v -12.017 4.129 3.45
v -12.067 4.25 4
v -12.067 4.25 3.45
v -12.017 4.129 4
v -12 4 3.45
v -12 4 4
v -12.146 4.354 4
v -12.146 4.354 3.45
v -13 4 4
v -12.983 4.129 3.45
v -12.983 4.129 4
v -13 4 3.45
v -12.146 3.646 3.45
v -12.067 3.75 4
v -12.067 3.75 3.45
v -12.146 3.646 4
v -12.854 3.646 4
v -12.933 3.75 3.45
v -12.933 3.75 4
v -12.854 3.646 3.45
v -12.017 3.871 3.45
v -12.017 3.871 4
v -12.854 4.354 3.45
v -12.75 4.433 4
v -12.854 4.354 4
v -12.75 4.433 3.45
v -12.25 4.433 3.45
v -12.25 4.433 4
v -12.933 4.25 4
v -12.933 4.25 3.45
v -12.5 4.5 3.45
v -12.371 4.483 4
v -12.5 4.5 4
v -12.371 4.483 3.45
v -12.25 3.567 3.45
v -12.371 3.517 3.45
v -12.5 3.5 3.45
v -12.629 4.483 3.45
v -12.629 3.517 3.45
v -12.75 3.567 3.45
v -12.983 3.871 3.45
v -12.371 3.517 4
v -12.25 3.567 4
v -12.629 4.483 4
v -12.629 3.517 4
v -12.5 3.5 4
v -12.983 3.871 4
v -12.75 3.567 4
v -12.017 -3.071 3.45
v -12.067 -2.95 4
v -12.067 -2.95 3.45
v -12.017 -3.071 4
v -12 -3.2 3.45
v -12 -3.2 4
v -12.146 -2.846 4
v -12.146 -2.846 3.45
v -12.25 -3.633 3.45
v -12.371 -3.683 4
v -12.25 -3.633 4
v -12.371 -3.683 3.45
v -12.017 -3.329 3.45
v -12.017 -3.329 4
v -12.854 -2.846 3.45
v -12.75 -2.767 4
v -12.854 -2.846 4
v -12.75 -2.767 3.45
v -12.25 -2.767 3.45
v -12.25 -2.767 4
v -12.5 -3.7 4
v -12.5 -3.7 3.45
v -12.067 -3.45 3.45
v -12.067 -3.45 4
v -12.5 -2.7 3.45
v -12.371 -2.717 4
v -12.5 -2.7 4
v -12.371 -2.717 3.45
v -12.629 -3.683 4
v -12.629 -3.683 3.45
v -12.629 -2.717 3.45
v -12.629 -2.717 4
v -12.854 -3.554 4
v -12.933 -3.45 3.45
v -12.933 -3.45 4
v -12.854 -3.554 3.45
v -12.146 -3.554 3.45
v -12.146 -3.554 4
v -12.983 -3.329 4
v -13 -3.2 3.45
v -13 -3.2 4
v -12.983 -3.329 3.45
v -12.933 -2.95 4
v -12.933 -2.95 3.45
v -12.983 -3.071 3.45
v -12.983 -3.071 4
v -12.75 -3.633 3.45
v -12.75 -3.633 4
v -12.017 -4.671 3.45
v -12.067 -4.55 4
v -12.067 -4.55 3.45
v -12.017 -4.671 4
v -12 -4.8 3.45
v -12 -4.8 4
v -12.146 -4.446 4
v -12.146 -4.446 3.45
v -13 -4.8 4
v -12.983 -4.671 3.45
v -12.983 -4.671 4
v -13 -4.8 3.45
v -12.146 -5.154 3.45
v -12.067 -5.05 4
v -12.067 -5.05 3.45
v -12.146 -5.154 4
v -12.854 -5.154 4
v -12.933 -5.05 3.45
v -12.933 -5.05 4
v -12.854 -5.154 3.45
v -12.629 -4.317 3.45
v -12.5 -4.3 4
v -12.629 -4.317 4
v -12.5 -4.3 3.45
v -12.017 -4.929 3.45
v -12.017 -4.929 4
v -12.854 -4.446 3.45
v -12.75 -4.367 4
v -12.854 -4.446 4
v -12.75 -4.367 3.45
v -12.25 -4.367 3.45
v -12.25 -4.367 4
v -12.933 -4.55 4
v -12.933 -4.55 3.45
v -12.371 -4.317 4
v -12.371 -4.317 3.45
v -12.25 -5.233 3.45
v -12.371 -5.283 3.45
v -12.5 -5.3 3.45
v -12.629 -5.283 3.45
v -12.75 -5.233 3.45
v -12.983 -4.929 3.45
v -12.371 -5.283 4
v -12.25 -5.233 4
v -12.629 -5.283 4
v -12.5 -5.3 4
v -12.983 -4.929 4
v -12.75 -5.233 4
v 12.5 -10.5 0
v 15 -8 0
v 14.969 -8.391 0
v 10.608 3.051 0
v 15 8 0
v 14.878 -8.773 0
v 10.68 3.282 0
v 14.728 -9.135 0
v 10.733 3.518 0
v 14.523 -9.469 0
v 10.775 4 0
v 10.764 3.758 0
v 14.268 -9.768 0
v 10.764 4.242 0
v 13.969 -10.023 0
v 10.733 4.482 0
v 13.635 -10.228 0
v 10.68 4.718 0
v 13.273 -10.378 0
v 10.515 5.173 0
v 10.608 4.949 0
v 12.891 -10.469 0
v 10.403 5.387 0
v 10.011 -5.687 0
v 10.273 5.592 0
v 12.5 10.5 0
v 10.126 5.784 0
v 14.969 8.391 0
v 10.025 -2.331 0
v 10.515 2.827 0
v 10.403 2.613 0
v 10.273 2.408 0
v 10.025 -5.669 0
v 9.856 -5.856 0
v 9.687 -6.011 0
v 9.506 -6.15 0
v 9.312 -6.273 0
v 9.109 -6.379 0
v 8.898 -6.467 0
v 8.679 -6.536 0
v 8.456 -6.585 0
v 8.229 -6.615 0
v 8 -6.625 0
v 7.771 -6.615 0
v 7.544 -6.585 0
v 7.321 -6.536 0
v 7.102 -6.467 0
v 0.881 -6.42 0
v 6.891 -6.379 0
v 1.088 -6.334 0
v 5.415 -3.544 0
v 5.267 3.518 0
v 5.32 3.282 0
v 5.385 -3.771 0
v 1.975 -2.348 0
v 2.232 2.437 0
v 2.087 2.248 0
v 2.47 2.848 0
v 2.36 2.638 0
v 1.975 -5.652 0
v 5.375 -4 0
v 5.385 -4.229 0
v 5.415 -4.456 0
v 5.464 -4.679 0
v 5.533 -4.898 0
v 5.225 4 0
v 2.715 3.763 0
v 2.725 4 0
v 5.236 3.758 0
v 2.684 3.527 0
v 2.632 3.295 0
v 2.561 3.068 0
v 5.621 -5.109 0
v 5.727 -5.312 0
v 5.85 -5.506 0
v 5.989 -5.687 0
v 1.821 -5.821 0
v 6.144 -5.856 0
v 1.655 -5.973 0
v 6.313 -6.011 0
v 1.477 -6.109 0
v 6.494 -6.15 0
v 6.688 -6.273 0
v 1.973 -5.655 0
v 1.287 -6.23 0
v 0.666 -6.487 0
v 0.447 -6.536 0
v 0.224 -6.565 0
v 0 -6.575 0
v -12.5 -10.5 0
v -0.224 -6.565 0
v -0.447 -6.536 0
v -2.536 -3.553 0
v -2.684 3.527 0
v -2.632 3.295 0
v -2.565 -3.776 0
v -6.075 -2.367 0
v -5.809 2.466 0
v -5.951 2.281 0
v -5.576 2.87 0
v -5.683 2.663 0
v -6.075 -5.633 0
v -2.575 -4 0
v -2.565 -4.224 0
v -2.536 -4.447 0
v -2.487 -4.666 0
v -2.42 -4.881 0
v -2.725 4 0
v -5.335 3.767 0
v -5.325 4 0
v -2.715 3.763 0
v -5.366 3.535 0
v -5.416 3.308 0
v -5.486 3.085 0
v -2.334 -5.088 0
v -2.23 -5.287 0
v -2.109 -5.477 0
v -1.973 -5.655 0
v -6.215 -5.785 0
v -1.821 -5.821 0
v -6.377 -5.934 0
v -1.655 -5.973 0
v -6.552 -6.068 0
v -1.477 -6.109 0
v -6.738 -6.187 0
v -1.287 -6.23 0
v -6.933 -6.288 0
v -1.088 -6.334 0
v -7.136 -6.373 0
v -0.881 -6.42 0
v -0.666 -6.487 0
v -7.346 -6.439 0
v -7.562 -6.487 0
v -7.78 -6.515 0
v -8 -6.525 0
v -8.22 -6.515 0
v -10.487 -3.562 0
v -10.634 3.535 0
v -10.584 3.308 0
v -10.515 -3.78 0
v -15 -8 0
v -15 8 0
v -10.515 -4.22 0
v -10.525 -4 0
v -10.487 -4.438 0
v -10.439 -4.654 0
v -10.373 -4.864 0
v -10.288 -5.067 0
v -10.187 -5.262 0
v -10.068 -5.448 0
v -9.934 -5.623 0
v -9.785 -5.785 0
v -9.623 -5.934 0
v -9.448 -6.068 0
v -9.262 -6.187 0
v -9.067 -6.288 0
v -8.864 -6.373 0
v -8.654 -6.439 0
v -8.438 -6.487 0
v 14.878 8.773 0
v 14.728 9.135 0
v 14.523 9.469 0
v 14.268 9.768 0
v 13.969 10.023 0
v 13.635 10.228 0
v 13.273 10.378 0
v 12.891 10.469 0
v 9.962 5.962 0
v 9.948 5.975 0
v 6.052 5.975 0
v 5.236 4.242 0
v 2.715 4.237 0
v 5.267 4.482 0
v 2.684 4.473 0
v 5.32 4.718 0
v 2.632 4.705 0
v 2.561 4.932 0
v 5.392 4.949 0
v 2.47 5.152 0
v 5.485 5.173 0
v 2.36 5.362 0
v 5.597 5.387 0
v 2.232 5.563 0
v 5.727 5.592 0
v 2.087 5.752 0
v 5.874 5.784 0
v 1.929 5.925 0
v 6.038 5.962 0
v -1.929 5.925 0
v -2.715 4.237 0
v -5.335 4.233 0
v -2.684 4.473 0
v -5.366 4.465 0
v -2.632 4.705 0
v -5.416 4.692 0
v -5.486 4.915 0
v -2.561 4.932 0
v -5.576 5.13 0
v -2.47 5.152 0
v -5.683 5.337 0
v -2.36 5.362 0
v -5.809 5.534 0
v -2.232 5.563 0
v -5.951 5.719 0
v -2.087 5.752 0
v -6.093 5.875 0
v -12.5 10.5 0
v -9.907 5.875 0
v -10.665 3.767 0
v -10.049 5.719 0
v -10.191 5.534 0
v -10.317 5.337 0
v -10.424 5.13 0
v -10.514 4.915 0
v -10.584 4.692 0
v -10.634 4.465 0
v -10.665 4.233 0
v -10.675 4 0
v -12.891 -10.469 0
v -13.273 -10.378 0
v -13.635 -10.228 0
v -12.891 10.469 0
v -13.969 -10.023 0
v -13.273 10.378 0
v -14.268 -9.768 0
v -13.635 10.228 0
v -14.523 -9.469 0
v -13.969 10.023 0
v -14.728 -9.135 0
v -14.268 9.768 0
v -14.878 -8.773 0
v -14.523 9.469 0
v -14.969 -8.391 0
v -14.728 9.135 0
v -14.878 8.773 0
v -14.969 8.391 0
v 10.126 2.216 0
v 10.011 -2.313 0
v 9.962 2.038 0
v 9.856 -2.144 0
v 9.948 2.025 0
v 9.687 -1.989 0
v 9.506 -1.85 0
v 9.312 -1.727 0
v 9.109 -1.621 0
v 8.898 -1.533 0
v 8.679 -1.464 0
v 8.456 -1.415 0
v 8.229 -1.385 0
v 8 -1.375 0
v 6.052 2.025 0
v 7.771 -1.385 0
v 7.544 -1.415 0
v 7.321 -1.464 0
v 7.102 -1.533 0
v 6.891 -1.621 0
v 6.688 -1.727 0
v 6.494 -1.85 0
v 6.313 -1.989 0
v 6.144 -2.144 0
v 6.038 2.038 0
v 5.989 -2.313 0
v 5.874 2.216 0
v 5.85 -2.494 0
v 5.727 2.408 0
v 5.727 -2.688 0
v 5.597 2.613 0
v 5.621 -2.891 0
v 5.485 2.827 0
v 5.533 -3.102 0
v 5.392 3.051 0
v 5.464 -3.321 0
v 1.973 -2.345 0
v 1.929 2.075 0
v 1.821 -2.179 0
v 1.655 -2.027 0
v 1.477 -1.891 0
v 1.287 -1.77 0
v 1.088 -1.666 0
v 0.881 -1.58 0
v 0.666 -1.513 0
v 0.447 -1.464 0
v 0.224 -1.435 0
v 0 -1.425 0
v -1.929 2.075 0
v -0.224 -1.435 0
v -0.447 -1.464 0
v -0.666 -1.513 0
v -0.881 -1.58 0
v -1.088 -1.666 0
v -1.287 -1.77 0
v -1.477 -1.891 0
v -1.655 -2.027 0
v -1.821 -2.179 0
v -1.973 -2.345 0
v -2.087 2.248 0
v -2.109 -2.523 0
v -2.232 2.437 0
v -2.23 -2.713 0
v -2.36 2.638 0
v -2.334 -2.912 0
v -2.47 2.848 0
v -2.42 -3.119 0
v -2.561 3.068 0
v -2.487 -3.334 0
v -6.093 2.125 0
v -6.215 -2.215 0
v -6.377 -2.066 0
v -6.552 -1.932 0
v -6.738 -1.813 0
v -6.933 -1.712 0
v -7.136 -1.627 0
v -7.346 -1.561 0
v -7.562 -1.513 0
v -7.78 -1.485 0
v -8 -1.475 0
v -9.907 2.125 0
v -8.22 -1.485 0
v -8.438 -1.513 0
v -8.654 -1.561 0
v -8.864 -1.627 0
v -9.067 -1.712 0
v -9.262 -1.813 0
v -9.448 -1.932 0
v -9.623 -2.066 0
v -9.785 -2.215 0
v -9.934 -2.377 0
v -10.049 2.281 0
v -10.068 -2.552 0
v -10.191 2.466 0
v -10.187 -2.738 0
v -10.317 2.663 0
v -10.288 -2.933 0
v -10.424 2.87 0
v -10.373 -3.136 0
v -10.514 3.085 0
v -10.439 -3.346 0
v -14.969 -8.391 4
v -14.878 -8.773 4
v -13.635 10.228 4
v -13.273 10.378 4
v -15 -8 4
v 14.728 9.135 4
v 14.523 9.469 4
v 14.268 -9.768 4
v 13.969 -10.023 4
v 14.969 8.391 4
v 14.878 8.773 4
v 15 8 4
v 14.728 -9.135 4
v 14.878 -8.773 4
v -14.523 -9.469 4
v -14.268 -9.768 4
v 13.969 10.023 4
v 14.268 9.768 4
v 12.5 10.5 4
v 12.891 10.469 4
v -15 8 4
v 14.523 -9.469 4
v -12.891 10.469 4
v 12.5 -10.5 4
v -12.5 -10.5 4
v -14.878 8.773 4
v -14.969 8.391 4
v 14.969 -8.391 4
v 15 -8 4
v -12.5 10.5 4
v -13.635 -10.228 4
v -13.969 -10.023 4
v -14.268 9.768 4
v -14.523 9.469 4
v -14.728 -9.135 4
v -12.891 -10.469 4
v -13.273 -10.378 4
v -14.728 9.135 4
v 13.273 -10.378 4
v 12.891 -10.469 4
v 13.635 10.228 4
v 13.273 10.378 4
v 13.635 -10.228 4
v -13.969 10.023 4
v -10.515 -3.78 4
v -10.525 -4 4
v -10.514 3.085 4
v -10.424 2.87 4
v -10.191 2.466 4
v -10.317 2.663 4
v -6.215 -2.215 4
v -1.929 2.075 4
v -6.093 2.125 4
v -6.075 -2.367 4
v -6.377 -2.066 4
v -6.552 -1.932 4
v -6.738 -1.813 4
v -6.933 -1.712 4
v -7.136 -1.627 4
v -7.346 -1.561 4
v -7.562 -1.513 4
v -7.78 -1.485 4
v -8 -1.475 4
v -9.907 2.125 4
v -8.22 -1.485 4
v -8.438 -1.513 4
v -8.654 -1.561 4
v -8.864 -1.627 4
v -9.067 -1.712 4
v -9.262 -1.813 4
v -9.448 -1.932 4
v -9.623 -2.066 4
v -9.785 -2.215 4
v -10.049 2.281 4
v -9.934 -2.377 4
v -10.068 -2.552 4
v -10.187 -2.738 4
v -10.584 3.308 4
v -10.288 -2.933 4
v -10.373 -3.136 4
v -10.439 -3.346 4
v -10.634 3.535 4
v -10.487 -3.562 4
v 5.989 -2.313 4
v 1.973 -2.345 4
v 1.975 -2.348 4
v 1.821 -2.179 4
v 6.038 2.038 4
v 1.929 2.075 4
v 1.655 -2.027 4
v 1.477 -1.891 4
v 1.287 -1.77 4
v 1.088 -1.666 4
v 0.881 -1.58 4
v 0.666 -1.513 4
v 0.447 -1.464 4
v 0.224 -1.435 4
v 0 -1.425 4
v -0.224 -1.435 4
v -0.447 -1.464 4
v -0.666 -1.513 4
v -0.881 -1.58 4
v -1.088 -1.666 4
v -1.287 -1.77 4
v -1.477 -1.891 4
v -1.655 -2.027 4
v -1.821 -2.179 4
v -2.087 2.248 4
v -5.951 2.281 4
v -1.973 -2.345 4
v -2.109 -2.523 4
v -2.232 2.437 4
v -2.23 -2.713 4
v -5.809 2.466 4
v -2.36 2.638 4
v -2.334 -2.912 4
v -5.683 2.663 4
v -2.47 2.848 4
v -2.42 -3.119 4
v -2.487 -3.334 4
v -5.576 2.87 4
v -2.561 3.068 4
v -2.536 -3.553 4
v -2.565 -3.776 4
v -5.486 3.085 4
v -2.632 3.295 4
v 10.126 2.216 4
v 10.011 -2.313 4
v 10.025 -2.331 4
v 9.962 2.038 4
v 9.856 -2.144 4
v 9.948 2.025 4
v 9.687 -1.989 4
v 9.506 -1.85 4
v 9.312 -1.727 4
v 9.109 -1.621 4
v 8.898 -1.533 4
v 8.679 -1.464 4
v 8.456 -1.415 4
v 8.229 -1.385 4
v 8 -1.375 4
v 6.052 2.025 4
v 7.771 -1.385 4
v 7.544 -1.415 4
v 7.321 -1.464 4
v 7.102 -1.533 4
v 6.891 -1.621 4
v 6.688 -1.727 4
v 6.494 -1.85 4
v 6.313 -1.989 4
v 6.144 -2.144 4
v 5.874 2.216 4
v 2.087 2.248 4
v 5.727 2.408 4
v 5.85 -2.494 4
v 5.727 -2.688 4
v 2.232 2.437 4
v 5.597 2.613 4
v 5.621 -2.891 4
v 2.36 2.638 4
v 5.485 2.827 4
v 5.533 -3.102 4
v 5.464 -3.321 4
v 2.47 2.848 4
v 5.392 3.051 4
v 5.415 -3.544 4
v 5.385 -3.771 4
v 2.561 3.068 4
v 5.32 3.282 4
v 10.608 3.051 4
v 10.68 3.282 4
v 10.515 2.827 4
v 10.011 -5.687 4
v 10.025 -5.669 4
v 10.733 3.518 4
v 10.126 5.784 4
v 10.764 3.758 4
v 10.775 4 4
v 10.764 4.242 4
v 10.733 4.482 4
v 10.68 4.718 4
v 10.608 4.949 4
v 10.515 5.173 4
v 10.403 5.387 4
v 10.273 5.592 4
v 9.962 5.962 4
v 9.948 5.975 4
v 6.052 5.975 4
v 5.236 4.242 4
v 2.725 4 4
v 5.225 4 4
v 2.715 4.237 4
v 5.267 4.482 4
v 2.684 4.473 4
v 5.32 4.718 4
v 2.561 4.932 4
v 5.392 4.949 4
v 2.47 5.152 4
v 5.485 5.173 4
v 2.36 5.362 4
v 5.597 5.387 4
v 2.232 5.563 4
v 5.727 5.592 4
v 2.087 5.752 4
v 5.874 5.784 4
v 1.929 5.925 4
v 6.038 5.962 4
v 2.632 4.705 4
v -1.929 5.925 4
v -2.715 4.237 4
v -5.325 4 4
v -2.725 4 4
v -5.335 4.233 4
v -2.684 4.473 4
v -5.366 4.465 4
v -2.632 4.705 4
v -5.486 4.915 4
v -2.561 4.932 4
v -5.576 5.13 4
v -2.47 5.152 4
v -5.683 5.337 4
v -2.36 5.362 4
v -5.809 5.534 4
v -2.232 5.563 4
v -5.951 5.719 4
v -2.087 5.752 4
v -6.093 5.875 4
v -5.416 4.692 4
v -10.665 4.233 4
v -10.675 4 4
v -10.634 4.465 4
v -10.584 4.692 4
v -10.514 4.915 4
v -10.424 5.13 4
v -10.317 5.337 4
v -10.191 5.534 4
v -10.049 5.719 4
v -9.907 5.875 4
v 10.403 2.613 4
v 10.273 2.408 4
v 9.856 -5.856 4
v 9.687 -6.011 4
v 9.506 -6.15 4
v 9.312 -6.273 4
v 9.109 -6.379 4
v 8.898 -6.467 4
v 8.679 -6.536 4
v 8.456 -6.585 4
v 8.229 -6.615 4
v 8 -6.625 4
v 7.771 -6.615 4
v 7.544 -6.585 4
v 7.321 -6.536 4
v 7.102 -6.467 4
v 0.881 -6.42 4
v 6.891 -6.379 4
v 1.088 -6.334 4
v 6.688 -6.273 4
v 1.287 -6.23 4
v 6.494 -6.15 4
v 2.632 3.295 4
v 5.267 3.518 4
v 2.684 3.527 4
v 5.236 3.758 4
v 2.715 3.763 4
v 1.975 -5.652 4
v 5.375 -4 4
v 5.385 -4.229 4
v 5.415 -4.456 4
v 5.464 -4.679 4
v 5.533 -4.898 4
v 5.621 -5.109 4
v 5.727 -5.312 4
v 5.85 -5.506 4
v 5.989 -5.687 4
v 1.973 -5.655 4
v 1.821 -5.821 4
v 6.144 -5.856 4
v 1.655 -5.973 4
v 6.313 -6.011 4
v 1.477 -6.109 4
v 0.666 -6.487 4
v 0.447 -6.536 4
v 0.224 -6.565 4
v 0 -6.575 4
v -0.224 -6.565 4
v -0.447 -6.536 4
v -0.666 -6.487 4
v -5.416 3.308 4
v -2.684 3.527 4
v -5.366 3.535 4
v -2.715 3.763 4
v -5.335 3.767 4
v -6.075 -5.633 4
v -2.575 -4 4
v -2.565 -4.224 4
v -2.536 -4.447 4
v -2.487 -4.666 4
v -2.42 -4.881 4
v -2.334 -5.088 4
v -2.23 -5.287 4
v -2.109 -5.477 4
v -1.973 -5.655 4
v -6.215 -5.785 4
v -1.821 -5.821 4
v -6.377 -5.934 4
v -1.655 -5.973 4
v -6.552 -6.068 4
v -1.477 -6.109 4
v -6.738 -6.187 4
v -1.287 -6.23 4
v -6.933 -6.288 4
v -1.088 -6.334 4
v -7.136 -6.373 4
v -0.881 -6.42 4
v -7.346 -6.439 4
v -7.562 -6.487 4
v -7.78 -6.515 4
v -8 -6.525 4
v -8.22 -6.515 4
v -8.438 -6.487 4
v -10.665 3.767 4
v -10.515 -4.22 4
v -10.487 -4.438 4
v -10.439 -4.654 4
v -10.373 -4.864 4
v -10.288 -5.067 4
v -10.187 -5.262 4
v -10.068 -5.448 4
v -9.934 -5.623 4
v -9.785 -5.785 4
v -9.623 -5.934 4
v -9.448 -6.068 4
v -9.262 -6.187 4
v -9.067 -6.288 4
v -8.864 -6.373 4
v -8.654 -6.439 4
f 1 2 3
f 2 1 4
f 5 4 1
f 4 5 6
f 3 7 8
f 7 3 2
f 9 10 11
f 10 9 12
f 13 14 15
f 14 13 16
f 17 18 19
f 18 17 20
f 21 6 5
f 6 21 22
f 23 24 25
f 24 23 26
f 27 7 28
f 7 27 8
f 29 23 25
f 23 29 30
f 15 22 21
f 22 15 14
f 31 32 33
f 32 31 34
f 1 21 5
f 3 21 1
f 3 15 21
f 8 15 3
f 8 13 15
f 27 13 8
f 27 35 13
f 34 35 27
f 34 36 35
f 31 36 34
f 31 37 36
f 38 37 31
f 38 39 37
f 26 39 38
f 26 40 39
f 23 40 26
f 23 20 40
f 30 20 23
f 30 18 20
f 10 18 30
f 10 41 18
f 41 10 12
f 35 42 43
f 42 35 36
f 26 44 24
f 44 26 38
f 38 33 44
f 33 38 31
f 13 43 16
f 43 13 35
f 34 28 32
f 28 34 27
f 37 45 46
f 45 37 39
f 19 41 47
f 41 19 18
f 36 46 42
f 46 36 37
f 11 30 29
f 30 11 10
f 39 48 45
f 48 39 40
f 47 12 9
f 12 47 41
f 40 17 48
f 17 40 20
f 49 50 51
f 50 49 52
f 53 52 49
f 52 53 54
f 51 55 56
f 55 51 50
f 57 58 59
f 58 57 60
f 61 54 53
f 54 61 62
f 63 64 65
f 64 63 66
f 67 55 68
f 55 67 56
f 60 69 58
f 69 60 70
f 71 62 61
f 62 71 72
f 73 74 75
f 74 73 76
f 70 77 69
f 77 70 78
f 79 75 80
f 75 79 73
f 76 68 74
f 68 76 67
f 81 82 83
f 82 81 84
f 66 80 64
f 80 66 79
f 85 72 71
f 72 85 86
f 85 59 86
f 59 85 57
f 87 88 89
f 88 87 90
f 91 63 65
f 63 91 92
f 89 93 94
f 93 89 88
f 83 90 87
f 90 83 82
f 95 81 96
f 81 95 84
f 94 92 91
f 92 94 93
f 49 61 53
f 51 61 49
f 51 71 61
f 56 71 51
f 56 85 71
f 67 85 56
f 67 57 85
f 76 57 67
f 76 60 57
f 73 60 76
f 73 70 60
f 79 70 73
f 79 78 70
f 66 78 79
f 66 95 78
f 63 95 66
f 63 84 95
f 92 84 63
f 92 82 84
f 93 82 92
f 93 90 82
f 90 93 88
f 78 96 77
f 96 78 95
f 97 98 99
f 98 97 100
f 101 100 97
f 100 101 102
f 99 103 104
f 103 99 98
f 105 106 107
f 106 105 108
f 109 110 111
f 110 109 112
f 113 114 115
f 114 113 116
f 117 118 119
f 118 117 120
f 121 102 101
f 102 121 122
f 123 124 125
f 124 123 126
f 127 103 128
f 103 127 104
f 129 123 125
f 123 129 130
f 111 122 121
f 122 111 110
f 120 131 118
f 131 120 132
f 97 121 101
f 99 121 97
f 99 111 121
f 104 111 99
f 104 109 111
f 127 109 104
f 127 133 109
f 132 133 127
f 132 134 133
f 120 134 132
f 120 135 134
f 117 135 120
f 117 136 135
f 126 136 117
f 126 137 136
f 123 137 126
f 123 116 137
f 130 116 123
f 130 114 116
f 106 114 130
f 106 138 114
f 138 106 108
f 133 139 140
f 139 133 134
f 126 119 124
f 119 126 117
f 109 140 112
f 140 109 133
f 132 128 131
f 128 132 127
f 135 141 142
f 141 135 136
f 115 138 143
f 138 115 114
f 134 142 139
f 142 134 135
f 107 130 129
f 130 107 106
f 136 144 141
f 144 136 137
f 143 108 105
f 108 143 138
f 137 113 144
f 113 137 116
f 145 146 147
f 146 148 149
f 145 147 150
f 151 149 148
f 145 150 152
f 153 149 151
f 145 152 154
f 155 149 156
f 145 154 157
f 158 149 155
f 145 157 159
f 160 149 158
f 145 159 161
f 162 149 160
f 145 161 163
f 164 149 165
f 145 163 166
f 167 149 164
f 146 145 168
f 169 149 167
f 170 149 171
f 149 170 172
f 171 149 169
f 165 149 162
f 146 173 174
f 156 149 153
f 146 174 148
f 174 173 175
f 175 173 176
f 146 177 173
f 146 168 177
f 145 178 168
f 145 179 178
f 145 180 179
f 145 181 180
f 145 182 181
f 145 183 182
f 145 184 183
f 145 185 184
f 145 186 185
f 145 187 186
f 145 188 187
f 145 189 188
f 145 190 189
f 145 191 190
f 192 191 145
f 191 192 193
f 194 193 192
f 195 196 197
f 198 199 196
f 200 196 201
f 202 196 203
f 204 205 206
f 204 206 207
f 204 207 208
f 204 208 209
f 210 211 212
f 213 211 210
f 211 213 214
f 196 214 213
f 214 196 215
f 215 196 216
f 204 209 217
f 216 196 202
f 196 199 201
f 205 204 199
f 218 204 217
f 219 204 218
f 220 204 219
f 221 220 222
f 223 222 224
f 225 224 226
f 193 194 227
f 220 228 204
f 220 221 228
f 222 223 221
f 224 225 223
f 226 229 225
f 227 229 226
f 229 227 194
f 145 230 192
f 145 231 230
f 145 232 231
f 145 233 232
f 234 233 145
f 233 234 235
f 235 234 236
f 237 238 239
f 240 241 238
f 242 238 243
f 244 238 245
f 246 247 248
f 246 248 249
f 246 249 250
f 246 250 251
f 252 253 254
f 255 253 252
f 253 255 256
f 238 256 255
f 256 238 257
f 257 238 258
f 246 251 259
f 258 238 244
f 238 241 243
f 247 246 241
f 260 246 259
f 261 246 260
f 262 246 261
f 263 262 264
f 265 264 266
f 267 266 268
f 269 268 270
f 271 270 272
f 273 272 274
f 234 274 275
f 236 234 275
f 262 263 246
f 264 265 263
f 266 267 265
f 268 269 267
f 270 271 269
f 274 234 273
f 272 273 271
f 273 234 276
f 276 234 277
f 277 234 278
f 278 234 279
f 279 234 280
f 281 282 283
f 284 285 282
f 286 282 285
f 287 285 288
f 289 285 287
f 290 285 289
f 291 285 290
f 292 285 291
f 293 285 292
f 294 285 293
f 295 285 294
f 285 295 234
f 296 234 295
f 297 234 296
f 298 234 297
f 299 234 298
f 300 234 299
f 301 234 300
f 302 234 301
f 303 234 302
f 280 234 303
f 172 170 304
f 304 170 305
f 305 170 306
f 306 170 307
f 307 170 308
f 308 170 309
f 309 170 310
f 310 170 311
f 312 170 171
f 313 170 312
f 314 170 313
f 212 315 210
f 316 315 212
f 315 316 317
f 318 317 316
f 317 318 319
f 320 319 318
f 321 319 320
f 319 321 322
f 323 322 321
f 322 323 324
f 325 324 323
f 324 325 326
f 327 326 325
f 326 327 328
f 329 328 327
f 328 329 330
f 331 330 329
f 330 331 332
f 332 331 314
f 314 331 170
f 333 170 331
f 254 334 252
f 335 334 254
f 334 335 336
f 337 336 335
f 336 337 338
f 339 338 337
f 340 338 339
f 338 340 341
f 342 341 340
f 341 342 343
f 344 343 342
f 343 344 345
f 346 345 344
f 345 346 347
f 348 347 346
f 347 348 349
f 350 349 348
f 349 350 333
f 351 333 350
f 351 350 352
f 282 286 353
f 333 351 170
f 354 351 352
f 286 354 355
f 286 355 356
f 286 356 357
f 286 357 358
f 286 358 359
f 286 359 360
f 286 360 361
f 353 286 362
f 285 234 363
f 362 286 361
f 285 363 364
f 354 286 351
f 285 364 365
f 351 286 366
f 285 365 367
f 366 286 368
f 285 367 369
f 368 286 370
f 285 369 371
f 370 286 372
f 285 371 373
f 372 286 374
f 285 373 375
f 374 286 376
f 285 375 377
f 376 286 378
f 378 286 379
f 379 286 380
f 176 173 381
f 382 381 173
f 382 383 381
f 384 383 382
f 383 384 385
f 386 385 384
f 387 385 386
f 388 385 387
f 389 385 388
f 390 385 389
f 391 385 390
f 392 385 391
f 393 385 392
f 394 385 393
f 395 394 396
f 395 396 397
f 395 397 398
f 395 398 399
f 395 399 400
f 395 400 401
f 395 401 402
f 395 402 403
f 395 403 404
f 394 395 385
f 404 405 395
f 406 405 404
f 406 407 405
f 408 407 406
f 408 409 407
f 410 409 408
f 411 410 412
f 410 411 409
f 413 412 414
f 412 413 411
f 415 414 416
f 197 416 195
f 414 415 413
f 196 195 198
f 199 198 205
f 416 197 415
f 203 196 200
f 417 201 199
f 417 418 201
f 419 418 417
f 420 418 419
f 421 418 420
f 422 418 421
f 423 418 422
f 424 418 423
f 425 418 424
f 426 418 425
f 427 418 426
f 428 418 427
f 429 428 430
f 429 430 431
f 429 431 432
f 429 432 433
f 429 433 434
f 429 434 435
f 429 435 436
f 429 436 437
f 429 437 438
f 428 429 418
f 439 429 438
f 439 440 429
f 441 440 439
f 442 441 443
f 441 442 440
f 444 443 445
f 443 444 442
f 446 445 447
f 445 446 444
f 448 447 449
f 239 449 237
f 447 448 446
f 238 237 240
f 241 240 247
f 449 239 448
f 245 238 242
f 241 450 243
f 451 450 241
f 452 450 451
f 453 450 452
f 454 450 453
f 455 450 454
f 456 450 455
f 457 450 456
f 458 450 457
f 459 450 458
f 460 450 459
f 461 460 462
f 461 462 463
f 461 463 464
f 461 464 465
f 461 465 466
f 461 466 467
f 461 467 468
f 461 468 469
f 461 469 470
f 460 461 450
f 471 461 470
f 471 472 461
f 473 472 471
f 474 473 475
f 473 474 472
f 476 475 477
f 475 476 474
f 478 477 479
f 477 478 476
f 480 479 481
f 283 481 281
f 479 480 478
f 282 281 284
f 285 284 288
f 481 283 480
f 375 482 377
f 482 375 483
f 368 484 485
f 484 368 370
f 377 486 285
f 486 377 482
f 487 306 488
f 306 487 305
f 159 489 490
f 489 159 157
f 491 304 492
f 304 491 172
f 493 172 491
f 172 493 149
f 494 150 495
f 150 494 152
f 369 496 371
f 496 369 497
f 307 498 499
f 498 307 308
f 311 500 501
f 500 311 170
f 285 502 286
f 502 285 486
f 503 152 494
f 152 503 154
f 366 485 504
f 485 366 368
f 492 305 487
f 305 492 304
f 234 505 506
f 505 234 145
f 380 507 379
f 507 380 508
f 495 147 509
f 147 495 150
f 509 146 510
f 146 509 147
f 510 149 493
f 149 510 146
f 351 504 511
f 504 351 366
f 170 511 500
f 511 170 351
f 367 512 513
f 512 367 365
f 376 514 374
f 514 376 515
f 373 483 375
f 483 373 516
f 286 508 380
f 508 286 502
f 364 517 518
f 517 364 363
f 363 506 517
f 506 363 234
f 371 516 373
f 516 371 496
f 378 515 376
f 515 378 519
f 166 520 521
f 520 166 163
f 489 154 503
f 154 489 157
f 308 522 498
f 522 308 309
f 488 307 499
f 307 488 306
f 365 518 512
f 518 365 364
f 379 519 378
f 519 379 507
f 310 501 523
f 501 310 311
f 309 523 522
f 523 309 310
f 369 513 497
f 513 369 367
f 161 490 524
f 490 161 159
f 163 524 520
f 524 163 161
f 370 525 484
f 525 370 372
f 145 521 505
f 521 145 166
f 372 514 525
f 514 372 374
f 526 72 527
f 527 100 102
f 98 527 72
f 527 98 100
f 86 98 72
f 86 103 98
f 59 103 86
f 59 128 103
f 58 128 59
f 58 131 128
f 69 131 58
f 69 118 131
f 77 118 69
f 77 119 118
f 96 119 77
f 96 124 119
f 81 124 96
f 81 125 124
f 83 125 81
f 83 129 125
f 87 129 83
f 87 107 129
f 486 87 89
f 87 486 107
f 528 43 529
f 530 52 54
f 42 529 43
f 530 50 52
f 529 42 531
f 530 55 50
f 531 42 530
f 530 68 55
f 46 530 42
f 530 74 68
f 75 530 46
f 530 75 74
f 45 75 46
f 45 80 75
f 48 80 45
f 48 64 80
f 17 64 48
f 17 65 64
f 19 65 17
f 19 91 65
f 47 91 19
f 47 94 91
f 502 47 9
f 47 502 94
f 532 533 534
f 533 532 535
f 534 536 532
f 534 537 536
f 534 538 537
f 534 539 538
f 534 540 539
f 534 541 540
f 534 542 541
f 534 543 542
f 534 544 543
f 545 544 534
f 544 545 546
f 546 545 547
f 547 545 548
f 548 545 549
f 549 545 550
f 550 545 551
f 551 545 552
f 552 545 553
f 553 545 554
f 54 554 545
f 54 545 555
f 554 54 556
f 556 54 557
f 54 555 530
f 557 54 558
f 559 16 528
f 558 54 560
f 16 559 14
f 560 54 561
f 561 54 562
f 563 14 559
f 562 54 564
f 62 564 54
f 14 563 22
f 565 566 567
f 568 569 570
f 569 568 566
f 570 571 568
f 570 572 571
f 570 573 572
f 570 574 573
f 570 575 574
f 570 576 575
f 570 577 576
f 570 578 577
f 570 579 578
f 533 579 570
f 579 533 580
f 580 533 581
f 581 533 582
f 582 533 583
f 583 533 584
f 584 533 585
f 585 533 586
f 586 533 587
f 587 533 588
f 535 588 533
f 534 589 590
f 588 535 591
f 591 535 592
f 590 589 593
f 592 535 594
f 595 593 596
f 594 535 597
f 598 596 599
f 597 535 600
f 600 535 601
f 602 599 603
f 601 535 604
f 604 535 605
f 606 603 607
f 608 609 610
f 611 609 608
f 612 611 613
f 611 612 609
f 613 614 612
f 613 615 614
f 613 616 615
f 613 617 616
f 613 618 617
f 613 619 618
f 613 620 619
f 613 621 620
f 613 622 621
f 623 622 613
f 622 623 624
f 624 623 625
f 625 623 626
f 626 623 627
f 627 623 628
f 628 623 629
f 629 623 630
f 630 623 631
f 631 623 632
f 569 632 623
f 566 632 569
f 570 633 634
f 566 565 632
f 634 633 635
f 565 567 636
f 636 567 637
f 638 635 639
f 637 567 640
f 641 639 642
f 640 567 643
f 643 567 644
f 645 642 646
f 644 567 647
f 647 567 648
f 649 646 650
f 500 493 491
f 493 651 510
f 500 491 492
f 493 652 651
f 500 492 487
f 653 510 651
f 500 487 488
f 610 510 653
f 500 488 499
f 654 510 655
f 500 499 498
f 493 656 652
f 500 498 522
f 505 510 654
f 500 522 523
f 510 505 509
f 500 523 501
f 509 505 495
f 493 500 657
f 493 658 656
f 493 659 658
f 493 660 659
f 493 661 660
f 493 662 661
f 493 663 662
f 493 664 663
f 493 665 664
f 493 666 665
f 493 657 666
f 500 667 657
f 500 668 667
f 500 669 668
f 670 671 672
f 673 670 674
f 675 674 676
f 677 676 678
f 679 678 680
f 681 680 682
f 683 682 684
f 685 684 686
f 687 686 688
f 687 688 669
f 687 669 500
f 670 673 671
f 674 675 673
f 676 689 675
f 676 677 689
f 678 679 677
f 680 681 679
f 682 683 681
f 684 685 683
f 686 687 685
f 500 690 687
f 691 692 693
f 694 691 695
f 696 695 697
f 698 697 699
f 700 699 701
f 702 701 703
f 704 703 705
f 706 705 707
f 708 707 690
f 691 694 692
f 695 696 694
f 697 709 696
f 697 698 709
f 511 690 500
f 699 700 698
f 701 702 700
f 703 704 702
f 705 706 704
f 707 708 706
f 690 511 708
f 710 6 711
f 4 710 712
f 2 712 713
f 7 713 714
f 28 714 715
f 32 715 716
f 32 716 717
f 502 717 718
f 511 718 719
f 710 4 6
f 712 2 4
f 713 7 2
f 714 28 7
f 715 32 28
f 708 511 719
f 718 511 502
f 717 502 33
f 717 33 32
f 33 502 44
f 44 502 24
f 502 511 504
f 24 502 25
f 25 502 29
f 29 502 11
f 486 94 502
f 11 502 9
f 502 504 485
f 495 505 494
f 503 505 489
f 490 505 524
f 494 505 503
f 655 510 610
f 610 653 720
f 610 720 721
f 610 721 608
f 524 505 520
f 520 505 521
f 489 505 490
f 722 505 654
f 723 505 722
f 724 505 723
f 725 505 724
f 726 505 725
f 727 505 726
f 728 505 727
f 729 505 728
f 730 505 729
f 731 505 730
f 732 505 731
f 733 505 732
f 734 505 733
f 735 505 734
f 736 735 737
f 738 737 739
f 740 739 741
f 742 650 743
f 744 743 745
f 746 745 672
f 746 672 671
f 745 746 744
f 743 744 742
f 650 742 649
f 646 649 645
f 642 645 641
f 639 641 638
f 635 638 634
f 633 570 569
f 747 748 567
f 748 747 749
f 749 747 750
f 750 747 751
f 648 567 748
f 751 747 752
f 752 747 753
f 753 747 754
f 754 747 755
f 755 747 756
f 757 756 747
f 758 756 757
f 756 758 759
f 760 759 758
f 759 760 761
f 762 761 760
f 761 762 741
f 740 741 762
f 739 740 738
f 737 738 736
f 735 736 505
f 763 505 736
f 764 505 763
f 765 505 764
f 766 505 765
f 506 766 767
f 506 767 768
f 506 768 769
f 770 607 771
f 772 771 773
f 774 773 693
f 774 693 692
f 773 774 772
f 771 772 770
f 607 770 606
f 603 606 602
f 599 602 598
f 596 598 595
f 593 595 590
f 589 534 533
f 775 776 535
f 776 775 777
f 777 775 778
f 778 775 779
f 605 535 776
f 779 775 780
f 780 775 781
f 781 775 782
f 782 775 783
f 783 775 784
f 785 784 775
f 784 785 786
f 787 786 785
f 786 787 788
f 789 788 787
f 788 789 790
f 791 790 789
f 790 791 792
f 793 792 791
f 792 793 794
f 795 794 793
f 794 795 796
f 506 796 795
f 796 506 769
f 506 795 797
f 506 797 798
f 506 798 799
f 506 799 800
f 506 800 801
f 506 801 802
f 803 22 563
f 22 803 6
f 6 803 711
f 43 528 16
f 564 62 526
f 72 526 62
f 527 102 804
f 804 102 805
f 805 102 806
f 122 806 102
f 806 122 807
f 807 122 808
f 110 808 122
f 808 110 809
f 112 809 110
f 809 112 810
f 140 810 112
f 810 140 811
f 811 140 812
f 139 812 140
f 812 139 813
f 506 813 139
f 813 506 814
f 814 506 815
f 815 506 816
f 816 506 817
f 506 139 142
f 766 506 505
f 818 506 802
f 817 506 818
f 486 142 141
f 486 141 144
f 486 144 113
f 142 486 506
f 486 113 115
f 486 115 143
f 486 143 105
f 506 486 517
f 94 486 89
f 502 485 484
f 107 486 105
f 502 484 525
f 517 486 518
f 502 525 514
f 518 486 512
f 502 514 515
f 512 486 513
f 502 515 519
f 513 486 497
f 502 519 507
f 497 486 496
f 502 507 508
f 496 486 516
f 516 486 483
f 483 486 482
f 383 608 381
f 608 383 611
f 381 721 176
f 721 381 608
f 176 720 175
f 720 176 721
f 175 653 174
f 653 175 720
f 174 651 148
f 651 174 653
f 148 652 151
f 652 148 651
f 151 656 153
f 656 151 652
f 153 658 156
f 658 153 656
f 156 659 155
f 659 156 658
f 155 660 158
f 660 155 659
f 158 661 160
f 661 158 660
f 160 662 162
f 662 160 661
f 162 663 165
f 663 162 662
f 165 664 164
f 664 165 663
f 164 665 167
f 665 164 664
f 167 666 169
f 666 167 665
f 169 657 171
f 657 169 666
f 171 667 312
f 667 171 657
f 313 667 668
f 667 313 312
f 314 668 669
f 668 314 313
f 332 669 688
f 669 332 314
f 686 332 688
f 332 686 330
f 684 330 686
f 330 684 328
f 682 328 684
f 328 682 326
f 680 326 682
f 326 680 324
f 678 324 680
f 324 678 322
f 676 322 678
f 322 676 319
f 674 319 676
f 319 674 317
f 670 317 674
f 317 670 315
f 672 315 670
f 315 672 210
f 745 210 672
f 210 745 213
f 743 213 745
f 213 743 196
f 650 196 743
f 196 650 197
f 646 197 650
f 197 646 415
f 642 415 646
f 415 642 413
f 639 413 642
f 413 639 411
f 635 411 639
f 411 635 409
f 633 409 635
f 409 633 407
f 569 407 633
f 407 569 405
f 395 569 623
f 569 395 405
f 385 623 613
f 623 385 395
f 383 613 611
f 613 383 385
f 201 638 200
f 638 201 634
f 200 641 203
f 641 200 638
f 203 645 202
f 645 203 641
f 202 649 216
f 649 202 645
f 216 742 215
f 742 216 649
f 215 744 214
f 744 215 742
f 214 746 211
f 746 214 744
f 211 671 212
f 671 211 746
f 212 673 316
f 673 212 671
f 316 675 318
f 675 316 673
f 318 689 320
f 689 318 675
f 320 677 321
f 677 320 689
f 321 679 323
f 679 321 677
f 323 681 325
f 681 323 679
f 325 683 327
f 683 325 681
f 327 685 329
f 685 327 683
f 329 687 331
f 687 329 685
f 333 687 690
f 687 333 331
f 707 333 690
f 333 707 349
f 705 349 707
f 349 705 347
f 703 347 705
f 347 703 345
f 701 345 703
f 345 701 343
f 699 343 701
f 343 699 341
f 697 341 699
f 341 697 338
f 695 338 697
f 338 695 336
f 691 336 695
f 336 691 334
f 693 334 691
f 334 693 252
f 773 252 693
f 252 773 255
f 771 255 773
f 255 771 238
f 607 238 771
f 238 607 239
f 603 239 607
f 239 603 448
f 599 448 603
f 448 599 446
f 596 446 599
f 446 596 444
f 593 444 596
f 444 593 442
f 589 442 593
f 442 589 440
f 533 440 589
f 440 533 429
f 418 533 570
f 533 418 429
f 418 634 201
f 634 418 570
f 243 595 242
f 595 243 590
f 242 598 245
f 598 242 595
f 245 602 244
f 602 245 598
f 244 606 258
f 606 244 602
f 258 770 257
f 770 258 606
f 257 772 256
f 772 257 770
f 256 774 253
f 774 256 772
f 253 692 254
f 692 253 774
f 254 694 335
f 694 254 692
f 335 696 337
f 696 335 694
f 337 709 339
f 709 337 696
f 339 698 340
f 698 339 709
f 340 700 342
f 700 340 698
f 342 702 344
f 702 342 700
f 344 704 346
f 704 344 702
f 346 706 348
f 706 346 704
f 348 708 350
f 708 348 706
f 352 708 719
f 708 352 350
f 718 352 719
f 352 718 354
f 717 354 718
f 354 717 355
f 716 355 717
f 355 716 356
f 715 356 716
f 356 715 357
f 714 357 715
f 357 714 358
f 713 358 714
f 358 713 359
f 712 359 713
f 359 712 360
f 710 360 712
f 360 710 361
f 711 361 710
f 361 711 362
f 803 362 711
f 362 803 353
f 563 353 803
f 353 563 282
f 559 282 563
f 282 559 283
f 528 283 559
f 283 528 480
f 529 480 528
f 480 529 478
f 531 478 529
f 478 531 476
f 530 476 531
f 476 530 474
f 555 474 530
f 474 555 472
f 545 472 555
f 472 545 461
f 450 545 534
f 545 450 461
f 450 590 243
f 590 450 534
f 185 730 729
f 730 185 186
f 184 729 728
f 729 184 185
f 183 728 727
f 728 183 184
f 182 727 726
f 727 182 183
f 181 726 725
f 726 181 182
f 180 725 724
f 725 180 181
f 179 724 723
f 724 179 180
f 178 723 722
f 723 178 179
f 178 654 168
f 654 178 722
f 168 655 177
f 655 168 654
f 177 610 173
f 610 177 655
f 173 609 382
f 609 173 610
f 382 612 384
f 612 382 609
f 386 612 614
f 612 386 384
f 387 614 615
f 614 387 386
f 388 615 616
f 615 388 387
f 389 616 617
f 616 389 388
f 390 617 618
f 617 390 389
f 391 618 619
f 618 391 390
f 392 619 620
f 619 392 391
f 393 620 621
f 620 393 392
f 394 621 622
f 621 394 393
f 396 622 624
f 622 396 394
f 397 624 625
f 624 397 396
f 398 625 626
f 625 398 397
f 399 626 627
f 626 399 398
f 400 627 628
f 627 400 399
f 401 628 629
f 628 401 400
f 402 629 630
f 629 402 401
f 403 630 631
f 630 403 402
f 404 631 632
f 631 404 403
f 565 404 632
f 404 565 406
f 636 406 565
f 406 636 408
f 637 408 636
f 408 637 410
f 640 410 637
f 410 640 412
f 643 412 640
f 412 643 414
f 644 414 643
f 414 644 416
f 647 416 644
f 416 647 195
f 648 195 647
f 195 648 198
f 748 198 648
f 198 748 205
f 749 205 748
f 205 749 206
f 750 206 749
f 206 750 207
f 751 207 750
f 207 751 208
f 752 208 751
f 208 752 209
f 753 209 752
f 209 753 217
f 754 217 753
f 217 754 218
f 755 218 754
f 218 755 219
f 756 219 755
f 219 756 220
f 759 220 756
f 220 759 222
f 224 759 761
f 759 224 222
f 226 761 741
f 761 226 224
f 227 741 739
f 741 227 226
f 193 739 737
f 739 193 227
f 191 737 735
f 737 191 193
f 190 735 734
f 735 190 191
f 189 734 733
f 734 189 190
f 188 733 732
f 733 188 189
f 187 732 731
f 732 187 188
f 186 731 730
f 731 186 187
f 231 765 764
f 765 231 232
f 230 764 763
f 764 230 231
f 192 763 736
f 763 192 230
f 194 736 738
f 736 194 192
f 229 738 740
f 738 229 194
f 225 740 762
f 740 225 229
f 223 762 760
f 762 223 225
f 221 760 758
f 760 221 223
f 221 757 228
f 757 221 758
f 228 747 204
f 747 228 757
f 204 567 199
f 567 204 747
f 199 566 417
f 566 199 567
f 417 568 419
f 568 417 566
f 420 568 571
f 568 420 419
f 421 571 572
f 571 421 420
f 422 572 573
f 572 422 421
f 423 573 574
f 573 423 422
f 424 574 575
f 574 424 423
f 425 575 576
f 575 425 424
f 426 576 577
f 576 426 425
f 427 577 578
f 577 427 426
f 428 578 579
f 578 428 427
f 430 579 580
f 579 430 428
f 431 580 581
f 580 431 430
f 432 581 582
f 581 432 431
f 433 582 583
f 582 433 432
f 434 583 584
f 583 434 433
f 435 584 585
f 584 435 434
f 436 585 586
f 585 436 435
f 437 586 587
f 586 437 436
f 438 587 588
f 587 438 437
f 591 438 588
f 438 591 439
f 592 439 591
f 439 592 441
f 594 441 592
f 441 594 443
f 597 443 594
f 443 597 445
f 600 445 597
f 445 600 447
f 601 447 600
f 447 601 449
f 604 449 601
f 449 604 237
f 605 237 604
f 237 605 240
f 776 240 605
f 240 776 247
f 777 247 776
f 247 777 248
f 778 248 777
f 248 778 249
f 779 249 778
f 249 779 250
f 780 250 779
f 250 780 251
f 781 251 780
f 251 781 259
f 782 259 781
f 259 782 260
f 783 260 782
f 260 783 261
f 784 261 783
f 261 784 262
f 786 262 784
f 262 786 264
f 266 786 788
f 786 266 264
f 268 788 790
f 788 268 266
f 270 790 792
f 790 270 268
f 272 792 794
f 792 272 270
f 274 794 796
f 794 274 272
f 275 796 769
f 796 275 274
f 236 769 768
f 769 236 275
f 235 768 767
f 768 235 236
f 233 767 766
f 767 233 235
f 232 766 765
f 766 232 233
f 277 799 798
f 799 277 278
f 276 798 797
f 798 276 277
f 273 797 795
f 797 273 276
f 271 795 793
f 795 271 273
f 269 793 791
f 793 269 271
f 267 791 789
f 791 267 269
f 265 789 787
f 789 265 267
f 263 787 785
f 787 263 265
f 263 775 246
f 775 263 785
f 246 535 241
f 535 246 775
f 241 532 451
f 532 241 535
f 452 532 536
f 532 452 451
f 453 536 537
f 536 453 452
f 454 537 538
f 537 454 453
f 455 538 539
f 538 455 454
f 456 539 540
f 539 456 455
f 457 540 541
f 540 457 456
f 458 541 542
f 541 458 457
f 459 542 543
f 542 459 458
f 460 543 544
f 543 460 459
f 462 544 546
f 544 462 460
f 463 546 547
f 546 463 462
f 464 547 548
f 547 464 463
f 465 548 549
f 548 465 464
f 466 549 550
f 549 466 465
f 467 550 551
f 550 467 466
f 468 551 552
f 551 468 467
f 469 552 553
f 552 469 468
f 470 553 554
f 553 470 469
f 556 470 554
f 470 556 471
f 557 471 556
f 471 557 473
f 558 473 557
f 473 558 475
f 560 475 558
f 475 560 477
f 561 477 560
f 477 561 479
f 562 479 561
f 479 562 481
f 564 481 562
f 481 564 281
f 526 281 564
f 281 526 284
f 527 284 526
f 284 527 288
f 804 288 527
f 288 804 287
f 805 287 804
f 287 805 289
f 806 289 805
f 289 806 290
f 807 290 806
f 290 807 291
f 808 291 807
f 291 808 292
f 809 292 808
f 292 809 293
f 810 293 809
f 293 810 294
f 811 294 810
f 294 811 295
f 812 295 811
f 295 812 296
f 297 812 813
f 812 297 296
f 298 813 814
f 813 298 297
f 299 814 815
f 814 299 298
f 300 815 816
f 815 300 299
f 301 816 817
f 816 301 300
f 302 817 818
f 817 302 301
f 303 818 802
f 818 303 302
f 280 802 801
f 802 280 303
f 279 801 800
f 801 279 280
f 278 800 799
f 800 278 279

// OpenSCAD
// MoseRase drive parts, dimensions in millimetres.
// Print the selected part with Z=0 against the bed.

/* [Part] */
drive_part = "fit_gauge"; // [fit_gauge,pulley_tt,pulley_5mm,wheel_tt,wheel_5mm,tire_tpu]
tt_fit = 0.15; // [0:0.05:0.35]
shaft_fit = 0.15; // [0:0.05:0.35]

/* [Hidden] */
drive_eps = 0.02;
drive_pitch = 2;
drive_teeth = 20;
drive_pitch_r = drive_teeth * drive_pitch / (2 * PI);
drive_tooth_r = drive_pitch_r - 0.254;
drive_flange_r = 7.8;
drive_pulley_h = 8.8;
drive_axle_pulley_h = 14.8;
drive_wheel_w = 10;
drive_rim_inner_r = 24.4;
drive_rim_r = 27.6;
drive_bead_r = 28.3;
drive_hub_r = 10.5;
drive_spoke_h = 5.6;
drive_tt_boss_h = 2;
drive_trap_width = 5.8;
drive_trap_depth = 2.65;
tt_shaft_width = 5.3;
tt_shaft_flats = 3.7;
d5_shaft_flat = 1.9;

// Two flats on the TT moulded shaft and one flat on the steel axle.
module drive_tt_profile(fit) {
    intersection() {
        circle(d=tt_shaft_width + fit, $fn=72);
        square([tt_shaft_width + fit + 0.2, tt_shaft_flats + fit], center=true);
    }
}

module drive_d5_profile(fit) {
    radius = (5 + fit) / 2;
    limit = d5_shaft_flat + fit / 2;
    intersection() {
        circle(r=radius, $fn=72);
        translate([-radius-drive_eps, -radius-drive_eps])
            square([radius+limit+drive_eps, 2*(radius+drive_eps)]);
    }
}

module drive_cut(z, h) {
    translate([0,0,z]) linear_extrude(height=h) children();
}

// Rounded 2GT groove approximation. The circumference and 0.254 pitch-line
// offset follow 20T pulley tables. Published root diameter is about 10.72 mm.
// https://grobinc.com/gt/
// Check fit with the purchased 2GT/GT2 belt before loading the printed pulley.
module drive_tooth_space() {
    mouth = 0.755;
    shoulder = 0.625;
    lead_in = 0.08;
    depth = 0.76;
    curve = [for (a=[0:7.5:90])
        [shoulder*cos(a), -lead_in-(depth-lead_in)*sin(a)]];
    polygon(concat(
        [[-mouth,0.5],[mouth,0.5],[mouth,0]],
        curve,
        [for (i=[len(curve)-2:-1:0]) [-curve[i][0],curve[i][1]]],
        [[-mouth,0]]
    ));
}

module drive_pulley_body() {
    difference() {
        union() {
            cylinder(r=drive_flange_r,h=1.02,$fn=96);
            translate([0,0,0.98])
                cylinder(r=drive_tooth_r,h=6.75,$fn=480);
            // The upper bevel starts inside the straight section, above
            // the grooves. Its sloped face supports the lip during printing.
            translate([0,0,7.61])
                cylinder(r1=drive_tooth_r-0.38,r2=drive_flange_r,h=1.0,$fn=96);
            translate([0,0,8.59])
                cylinder(r=drive_flange_r,h=drive_pulley_h-8.59,$fn=96);
        }
        drive_cut(1.04,6.50)
            for (i=[0:drive_teeth-1])
                rotate(360*i/drive_teeth)
                    translate([0,drive_tooth_r]) drive_tooth_space();
    }
}

// Z=0 faces the gearbox, with a gap before the first flange. The axial
// washer bears on the outer flat face to retain the keyed pulley.
module pulley_tt(fit=tt_fit) {
    difference() {
        drive_pulley_body();
        drive_cut(-drive_eps,drive_pulley_h+2*drive_eps)
            drive_tt_profile(fit);
        translate([0,0,-drive_eps]) cylinder(d=6.9, h=1.0+drive_eps, $fn=72);
    }
}

// A hex nut slots in axially. Its flat sides react M3 screw torque.
// The radial screw bears on the flat face of the steel shaft.
module drive_clamp_cut(screw_z, trap_x, top_z, tool_radius) {
    hex_outer_r = 3.22;
    translate([trap_x, -drive_trap_width/2, screw_z-hex_outer_r])
        cube([drive_trap_depth, drive_trap_width, top_z-screw_z+hex_outer_r+drive_eps]);
    translate([d5_shaft_flat-0.15, 0, screw_z])
        rotate([0,90,0])
            cylinder(d=3.25, h=tool_radius-d5_shaft_flat+0.25, $fn=42);
}

// Fit an M3×6 grub screw and M3 hex nut. Z=0 faces the bearing carrier.
module pulley_5mm(fit=shaft_fit) {
    difference() {
        union() {
            drive_pulley_body();
            translate([0,0,drive_pulley_h-drive_eps])
                cylinder(r=7.6,h=drive_axle_pulley_h-drive_pulley_h+drive_eps,$fn=96);
        }
        drive_cut(-drive_eps,drive_axle_pulley_h+2*drive_eps)
            drive_d5_profile(fit);
        drive_clamp_cut(11.45,3.85,drive_axle_pulley_h,7.6);
    }
}

module drive_rim_with_beads() {
    rotate_extrude($fn=144)
        polygon([
            [drive_rim_inner_r,0], [drive_bead_r,0],
            [drive_bead_r,0.65], [drive_rim_r,1.35],
            [drive_rim_r,drive_wheel_w-1.35], [drive_bead_r,drive_wheel_w-0.65],
            [drive_bead_r,drive_wheel_w], [drive_rim_inner_r,drive_wheel_w]
        ]);
}

module drive_tire_keys(clearance=0) {
    for (a=[0:45:315])
        rotate([0,0,a])
            translate([27.4-clearance,-1.4-clearance,1.2-clearance])
                cube([0.99+2*clearance,2.8+2*clearance,7.6+2*clearance]);
}

module drive_spoke_profile() {
    // The open sector at +X is the path for a ball-end key on the D5 hub.
    for (a=[30:60:330])
        rotate(a)
            hull() {
                translate([9.6,0]) circle(r=2.55,$fn=36);
                translate([24.25,0]) circle(r=2.2,$fn=36);
            }
}

module drive_wheel_body() {
    union() {
        drive_rim_with_beads();
        drive_tire_keys();
        cylinder(r=drive_hub_r, h=drive_wheel_w, $fn=96);
        linear_extrude(height=drive_spoke_h) drive_spoke_profile();
    }
}

// Z=0 is the exposed wheel face. The inner 2 mm boss increases keyed length
// while the tire remains 3.4 mm clear of the gearbox.
module wheel_tt(fit=tt_fit) {
    retainer_seat_z = 4.0;
    height = drive_wheel_w + drive_tt_boss_h;
    difference() {
        union() {
            drive_wheel_body();
            translate([0,0,drive_wheel_w-drive_eps])
                cylinder(d=13,h=drive_tt_boss_h+drive_eps,$fn=96);
        }
        drive_cut(-drive_eps,height+2*drive_eps) drive_tt_profile(fit);
        translate([0,0,-drive_eps]) cylinder(d=8.4,h=retainer_seat_z+drive_eps,$fn=72);
    }
}

// Fit an M3×8 grub screw and M3 hex nut. Load the nut from the inner face.
// A ball-end key reaches the screw via the open spoke from the outer face.
module wheel_5mm(fit=shaft_fit) {
    difference() {
        drive_wheel_body();
        drive_cut(-drive_eps,drive_wheel_w+2*drive_eps) drive_d5_profile(fit);
        drive_clamp_cut(5.0,5.1,drive_wheel_w,drive_hub_r);
    }
}

module tire_tpu() {
    difference() {
        rotate_extrude($fn=144)
            polygon([
                [28.42,0], [29.6,0], [30,0.55], [30,9.45], [29.6,10],
                [28.42,10], [28.42,9.32], [27.54,8.43],
                [27.54,1.57], [28.42,0.68]
            ]);
        drive_tire_keys(0.2);
    }
}

// TT holes beside the single-marker row, D5 holes beside the double marker.
// Columns left-to-right add 0.05, 0.15 and 0.25 mm to marked dimensions.
module drive_fit_gauge() {
    difference() {
        linear_extrude(height=4)
            hull() for (x=[-12.5,12.5],y=[-8,8])
                translate([x,y]) circle(r=2.5,$fn=40);
        drive_cut(-drive_eps,4+2*drive_eps)
            for (i=[0:2]) {
                fit = 0.05+0.10*i;
                translate([(i-1)*8,4]) drive_tt_profile(fit);
                translate([(i-1)*8,-4]) drive_d5_profile(fit);
            }
        for (p=[[-12.5,4],[-12.5,-3.2],[-12.5,-4.8]])
            translate([p[0],p[1],3.45]) cylinder(d=1,h=0.6,$fn=24);
    }
}

// Smooth belt envelope for assembly checks. The local axes run along +Y,
// with teeth inward and 6 mm width parallel to Z.
module drive_belt_preview(center_distance=70) {
    linear_extrude(height=6)
        difference() {
            hull() for (y=[0,center_distance])
                translate([0,y]) circle(r=drive_pitch_r+0.64,$fn=72);
            hull() for (y=[0,center_distance])
                translate([0,y]) circle(r=drive_pitch_r-0.7,$fn=72);
        }
}

if (drive_part=="fit_gauge") drive_fit_gauge();
else if (drive_part=="pulley_tt") pulley_tt();
else if (drive_part=="pulley_5mm") pulley_5mm();
else if (drive_part=="wheel_tt") wheel_tt();
else if (drive_part=="wheel_5mm") wheel_5mm();
else if (drive_part=="tire_tpu") tire_tpu();
